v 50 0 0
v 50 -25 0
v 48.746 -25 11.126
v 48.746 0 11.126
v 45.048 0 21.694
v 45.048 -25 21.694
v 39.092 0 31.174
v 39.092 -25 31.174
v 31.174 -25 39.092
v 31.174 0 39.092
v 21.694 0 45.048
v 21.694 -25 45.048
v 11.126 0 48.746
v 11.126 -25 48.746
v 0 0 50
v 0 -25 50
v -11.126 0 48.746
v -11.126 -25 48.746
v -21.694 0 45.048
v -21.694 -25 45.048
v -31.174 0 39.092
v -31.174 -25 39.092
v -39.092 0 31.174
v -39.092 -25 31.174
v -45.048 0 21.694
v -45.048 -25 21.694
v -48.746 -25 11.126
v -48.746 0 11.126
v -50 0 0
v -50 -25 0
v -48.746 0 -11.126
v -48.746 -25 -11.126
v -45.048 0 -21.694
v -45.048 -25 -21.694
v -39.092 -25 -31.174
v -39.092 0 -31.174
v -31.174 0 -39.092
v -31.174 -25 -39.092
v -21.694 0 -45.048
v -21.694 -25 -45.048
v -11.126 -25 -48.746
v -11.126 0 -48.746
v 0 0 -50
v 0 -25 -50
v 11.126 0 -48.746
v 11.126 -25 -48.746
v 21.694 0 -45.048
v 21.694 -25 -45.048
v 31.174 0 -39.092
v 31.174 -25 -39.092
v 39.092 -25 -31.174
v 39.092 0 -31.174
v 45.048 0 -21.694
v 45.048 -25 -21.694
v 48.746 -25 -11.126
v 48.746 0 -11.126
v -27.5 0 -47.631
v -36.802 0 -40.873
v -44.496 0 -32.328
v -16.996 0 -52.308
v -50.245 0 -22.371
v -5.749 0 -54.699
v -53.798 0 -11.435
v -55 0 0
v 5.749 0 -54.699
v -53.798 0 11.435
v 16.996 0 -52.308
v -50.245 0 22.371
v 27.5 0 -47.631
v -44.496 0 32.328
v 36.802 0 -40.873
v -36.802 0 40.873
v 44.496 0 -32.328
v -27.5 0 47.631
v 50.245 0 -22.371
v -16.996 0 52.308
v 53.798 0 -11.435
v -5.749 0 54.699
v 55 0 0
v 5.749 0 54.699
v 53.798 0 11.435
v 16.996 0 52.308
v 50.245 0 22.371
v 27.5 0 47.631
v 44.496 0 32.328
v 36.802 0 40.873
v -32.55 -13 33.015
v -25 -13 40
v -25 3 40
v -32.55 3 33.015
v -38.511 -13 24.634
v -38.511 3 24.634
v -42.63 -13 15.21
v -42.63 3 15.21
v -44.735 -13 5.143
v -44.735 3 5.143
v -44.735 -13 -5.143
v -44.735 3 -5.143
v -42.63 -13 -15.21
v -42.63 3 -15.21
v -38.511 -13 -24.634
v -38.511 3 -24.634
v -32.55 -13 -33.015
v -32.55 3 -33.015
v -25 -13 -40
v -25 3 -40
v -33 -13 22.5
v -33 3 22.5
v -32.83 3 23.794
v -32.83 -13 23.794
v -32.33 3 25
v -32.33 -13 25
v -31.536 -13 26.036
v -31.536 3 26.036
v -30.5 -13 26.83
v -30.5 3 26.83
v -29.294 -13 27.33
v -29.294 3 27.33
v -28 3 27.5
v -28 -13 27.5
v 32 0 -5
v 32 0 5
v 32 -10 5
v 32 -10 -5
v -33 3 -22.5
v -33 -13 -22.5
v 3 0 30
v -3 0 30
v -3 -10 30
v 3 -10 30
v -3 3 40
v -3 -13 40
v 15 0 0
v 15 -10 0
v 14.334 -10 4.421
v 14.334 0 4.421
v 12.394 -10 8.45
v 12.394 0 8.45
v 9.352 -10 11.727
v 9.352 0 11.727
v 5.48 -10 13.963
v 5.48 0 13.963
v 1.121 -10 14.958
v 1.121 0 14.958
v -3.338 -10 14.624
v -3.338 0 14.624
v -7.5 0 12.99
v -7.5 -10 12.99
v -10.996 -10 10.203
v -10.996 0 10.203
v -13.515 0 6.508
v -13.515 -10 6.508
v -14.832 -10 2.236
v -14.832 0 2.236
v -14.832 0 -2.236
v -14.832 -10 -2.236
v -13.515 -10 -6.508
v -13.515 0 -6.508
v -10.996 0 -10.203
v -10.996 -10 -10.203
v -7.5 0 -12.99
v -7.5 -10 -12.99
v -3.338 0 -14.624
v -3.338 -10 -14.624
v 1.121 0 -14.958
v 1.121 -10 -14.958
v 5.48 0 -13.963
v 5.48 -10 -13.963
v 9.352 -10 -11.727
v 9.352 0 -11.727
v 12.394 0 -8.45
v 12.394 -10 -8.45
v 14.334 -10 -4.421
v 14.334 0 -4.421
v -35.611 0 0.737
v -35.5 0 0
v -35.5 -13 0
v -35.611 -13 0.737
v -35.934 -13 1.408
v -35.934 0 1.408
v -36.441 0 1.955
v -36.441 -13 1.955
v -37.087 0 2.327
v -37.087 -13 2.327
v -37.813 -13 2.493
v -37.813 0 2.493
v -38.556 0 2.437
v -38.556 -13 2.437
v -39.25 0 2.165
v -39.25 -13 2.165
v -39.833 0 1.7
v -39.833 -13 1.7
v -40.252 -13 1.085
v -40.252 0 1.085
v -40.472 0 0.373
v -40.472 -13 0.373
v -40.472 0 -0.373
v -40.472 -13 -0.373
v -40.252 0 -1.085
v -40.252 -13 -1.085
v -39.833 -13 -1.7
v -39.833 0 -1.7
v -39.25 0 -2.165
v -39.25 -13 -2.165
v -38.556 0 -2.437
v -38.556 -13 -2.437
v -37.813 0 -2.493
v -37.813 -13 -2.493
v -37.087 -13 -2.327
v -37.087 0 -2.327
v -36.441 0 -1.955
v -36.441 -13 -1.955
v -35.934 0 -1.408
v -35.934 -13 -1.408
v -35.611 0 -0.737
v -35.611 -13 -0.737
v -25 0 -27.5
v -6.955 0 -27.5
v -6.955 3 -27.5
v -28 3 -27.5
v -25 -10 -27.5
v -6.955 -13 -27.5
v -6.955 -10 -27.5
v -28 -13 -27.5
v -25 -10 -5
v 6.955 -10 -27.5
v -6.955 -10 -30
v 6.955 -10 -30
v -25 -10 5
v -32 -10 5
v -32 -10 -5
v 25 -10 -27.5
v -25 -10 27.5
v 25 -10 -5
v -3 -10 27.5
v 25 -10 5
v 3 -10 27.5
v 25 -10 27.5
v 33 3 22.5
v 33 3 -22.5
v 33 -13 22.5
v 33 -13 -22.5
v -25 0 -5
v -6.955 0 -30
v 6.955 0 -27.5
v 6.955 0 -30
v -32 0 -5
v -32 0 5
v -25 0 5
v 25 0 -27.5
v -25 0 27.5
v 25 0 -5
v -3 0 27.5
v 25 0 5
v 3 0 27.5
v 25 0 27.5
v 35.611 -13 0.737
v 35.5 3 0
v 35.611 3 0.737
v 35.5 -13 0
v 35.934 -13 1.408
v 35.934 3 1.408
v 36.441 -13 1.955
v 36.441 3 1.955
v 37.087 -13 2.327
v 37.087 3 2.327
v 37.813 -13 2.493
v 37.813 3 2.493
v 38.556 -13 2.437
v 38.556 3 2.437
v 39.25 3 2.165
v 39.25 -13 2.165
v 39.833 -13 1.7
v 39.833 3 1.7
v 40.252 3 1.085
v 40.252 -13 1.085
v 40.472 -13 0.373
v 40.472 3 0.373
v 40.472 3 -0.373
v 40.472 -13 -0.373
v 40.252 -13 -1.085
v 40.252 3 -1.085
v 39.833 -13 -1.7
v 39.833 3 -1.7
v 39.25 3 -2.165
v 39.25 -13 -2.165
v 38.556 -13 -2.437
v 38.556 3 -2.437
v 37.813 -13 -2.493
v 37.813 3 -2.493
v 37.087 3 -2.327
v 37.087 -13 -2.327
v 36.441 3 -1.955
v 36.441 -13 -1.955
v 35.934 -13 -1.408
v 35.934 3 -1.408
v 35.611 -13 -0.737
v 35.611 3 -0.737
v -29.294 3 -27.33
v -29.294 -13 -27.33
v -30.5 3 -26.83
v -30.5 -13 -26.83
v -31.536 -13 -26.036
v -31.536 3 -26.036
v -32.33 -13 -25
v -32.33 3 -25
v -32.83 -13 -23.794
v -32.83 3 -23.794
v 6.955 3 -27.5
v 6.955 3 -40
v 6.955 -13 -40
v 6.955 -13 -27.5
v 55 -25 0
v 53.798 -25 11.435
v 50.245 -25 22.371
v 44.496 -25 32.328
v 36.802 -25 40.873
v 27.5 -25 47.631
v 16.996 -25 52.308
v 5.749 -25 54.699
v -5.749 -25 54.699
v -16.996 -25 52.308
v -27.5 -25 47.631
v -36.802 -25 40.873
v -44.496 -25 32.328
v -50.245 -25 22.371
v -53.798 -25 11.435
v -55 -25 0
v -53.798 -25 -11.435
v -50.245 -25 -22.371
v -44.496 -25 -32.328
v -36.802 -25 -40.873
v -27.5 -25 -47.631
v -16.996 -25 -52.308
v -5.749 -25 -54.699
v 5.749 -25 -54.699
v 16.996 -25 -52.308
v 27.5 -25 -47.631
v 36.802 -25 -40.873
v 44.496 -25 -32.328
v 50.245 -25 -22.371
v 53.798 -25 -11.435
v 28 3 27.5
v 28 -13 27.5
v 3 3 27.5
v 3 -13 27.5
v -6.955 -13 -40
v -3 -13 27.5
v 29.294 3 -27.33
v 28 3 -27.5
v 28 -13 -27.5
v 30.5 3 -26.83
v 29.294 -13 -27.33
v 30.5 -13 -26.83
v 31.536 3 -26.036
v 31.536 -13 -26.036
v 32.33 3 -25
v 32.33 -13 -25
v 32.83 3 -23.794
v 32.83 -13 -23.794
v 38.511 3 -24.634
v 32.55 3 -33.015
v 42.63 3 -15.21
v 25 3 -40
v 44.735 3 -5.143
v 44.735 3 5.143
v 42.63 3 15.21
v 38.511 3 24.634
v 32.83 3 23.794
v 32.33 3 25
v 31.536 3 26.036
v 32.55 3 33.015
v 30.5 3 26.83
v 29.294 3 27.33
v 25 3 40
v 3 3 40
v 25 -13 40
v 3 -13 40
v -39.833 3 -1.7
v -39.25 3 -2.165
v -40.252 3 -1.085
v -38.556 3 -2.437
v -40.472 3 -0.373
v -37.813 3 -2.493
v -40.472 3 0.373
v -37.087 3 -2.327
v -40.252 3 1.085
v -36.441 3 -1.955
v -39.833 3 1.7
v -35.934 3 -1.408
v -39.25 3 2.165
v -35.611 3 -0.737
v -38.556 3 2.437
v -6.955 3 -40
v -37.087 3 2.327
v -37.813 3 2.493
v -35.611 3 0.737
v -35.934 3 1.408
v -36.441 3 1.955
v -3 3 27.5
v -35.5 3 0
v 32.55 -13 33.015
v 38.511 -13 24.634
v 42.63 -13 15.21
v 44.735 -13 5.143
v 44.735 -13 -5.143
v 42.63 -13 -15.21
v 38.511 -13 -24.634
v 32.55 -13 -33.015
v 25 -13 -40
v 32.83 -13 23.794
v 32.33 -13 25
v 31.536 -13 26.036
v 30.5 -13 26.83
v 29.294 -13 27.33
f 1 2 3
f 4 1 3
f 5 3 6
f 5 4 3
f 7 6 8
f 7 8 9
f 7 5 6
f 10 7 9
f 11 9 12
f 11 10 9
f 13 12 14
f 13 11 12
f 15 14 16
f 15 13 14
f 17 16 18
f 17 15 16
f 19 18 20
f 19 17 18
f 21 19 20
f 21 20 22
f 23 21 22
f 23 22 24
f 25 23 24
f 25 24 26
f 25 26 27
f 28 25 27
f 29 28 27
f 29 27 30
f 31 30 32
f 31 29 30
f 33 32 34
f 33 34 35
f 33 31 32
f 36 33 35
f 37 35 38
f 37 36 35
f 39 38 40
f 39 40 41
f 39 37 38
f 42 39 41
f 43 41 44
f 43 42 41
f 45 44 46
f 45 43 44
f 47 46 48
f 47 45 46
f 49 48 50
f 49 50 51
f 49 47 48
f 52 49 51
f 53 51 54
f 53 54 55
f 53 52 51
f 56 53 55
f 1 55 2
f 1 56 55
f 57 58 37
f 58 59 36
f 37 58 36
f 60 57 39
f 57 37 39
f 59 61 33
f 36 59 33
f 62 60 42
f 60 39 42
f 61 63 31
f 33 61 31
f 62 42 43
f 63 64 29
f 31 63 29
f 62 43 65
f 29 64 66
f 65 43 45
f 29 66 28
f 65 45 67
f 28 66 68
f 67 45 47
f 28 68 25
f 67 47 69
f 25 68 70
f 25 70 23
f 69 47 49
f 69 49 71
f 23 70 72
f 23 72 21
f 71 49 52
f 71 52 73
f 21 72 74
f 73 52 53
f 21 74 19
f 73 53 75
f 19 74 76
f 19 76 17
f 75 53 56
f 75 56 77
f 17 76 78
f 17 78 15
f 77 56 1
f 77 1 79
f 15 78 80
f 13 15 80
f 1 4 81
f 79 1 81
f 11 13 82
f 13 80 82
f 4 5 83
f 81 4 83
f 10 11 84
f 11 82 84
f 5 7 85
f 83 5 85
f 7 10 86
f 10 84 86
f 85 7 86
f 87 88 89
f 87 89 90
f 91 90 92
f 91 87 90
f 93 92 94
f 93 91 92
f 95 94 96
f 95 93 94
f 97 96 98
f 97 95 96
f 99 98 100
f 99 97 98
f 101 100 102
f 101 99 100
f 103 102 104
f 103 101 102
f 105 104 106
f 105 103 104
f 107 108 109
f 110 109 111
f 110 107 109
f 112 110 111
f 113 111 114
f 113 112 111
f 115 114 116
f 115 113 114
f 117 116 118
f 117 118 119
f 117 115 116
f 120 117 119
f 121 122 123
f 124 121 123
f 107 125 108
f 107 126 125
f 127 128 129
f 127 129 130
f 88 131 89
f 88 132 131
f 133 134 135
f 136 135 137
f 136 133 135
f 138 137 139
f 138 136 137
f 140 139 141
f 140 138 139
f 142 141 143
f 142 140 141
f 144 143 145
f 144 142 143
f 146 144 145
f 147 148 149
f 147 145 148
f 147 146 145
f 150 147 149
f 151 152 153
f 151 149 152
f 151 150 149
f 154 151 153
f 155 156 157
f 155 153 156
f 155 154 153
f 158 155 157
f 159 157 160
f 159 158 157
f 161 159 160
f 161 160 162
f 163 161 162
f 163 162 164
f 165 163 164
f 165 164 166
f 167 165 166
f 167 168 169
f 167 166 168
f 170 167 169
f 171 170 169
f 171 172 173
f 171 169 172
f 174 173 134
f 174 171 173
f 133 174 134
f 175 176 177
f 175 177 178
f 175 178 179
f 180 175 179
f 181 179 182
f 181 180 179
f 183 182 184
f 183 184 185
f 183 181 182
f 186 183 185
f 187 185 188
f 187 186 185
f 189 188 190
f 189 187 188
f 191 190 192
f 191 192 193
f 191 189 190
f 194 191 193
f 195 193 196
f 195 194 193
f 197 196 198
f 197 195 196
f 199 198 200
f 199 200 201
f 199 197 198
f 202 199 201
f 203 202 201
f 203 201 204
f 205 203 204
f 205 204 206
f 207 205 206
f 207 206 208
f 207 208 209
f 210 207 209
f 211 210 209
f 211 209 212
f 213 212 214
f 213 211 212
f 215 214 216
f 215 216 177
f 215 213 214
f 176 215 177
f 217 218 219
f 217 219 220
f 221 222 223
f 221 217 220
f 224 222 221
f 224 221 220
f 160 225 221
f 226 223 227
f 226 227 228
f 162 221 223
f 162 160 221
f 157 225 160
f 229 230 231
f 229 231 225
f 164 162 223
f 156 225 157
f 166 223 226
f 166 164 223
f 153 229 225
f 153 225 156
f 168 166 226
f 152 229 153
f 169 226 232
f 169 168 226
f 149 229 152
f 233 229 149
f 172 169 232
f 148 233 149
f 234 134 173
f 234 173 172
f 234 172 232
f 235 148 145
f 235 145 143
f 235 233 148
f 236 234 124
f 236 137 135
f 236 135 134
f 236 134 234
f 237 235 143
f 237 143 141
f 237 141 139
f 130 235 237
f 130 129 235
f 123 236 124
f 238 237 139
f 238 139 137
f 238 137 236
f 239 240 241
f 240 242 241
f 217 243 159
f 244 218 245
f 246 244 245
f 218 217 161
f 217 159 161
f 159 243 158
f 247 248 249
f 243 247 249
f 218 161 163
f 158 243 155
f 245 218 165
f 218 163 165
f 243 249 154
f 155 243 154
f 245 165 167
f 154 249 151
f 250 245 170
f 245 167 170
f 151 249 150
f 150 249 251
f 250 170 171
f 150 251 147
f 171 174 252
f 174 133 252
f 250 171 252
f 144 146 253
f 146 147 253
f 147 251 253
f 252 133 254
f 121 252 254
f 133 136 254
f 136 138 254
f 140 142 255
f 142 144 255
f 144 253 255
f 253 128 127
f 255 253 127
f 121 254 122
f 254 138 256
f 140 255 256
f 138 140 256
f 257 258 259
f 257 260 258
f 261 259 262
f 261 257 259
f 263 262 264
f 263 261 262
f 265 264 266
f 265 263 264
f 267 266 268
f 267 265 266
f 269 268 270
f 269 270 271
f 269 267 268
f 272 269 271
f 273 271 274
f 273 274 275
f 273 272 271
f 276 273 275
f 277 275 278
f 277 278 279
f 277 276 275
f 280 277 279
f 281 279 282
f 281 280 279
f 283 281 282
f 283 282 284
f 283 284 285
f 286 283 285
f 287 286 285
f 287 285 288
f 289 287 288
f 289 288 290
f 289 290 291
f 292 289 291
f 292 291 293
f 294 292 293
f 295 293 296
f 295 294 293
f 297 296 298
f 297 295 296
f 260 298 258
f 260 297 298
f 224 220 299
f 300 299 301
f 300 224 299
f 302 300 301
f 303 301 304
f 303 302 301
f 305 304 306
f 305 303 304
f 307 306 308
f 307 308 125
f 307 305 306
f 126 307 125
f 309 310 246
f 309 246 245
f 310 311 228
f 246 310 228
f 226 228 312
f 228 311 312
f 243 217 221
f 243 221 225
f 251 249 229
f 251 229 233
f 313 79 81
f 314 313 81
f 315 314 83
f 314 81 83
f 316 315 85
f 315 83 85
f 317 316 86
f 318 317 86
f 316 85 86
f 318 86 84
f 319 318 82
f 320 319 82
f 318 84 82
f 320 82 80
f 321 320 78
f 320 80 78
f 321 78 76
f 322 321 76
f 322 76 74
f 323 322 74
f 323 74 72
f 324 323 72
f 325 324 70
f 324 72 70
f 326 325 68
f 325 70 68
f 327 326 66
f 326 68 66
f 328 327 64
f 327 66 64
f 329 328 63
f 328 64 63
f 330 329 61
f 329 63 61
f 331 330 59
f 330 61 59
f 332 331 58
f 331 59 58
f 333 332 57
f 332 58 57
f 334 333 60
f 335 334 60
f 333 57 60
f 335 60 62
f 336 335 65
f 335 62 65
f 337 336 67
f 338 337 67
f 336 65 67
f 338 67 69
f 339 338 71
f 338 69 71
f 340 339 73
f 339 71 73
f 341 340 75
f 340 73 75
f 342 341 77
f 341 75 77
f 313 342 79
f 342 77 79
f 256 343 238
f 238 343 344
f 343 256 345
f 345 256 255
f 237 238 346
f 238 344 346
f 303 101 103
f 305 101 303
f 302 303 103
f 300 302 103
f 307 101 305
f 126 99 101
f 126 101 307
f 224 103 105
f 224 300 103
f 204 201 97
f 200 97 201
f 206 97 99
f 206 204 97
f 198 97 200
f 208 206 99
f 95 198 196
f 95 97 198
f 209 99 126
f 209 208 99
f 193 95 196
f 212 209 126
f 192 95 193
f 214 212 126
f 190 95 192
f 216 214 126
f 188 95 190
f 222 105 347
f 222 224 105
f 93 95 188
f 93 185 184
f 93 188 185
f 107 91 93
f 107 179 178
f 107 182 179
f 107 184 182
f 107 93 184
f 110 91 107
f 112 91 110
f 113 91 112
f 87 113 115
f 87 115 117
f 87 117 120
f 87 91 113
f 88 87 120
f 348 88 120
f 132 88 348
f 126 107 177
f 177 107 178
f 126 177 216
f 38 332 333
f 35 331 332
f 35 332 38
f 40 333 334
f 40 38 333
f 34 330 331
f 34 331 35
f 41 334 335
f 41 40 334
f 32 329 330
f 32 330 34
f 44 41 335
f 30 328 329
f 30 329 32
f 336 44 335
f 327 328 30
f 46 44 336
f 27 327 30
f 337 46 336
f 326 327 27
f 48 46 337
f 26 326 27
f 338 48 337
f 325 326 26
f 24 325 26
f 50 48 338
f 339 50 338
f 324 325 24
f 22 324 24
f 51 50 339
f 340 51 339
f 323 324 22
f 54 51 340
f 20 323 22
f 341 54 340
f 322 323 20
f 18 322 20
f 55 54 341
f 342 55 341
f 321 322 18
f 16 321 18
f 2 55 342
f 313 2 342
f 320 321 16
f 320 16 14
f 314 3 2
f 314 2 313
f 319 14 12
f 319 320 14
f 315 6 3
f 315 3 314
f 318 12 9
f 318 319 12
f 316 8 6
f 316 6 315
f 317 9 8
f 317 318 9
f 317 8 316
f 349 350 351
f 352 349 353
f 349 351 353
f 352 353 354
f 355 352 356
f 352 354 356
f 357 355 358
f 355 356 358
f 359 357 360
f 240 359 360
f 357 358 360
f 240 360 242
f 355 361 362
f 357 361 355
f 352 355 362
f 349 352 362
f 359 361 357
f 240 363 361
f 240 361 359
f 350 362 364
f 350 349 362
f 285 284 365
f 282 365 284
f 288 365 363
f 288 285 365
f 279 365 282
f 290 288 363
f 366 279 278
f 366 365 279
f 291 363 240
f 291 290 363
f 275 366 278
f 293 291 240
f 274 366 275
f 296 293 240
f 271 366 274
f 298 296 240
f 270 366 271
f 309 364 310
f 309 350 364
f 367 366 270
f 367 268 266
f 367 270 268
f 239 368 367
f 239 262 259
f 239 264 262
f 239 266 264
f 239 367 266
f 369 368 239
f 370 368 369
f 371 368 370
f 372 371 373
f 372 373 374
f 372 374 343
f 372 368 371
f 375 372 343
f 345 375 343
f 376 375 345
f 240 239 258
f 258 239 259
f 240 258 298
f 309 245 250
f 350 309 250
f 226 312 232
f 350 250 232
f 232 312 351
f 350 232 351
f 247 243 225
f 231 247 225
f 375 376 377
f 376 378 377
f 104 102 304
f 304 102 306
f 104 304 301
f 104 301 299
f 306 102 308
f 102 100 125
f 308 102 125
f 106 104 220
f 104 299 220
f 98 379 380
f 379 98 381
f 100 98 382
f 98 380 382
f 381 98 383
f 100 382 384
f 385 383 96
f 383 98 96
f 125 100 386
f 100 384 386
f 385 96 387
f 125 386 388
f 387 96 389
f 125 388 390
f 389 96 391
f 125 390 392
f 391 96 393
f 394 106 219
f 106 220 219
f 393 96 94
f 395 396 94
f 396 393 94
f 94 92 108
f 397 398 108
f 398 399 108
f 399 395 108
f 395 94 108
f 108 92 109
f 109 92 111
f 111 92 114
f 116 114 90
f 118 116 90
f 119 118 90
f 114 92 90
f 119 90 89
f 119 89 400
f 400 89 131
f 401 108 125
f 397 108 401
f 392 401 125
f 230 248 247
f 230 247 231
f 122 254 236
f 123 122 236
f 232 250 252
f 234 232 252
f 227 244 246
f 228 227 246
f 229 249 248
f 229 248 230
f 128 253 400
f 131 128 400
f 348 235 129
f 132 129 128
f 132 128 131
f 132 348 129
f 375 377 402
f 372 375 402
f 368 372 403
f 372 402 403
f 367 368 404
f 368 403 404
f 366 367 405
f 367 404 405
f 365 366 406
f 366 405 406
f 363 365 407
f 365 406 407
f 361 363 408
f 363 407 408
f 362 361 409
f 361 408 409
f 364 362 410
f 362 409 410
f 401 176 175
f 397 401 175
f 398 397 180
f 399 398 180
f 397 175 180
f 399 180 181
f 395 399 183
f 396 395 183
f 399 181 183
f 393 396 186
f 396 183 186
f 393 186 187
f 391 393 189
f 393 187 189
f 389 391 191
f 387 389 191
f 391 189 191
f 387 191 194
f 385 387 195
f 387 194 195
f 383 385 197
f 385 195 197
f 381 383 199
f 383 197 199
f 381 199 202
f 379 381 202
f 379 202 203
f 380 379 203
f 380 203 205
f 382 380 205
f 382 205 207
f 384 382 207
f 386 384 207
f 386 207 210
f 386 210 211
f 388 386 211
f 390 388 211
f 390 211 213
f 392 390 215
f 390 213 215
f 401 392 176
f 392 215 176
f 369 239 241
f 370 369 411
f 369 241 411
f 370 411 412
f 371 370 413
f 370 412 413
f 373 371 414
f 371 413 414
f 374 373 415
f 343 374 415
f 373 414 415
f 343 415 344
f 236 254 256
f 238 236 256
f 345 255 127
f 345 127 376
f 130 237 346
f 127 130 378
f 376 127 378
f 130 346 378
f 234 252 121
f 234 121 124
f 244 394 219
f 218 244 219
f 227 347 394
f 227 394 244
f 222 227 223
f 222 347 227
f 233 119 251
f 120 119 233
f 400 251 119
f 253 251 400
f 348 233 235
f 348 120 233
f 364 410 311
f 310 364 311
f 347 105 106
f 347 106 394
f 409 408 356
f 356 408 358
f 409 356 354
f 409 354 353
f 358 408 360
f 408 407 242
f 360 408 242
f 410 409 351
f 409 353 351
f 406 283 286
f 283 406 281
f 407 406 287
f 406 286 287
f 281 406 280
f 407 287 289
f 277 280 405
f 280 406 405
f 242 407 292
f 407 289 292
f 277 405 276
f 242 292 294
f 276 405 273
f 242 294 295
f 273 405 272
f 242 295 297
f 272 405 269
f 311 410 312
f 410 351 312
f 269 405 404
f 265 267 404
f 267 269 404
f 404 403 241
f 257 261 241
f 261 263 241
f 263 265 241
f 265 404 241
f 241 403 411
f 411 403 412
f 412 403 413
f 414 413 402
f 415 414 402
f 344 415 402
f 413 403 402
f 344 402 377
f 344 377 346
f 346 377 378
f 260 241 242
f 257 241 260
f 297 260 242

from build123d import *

# Parameters (mm, degrees)
F0_W          = 50
F0_H          = 60
F0_R          = 15
F1_DEPTH      = 10
F2_R          = 2.5
F3_DEPTH      = 13
F3_DEPTH_BACK = 3
F4_W          = 10
F4_H          = 10
F5_DEPTH      = 7
F7_R          = 55
F7_R_2        = 50
F8_DEPTH      = 25


# Not quite as in the source:
# - a feature names something its author has since deleted; it is built from what else it names


with BuildPart() as f1:
    # F0 (on Front) → F1 (new body)
    with BuildSketch(Plane.XZ):
        Rectangle(F0_W, F0_H)
        Circle(F0_R, mode=Mode.SUBTRACT)
    extrude(amount=F1_DEPTH)

    # F2 (on Front) → F3 (join, two sides)
    with BuildSketch(Plane.XZ) as f3_sk:
        with BuildLine():
            Line((-3, 40), (-25, 40))
            ThreePointArc((-25, 40), (-45, 0), (-25, -40))
            Line((-25, -40), (-6.9549679495, -40))
            Line((-6.9549679495, -40), (-6.9549679495, -27.5))
            Line((-6.9549679495, -27.5), (-28, -27.5))
            ThreePointArc((-28, -27.5), (-31.5355339059, -26.0355339059), (-33, -22.5))
            Line((-33, -22.5), (-33, 22.5))
            ThreePointArc((-33, 22.5), (-31.5355339059, 26.0355339059), (-28, 27.5))
            Line((-28, 27.5), (-3, 27.5))
            Line((-3, 27.5), (-3, 40))
        make_face()
        with Locations((-38, 0)):
            Circle(F2_R, mode=Mode.SUBTRACT)
    extrude(amount=F3_DEPTH)
    extrude(f3_sk.sketch, amount=-F3_DEPTH_BACK)

    # F4 (on face) → F5 (join)
    with BuildSketch(Plane(origin=(-25, 0, 0), x_dir=(0, -1, 0), z_dir=(-1, 0, 0))):
        with Locations((5, 0)):
            Rectangle(F4_W, F4_H)
    extrude(amount=F5_DEPTH)

    # F6: F1 across plane


with BuildPart() as f1_1:
    add(f1.part)
    add(f1.part.mirror(Plane.YZ))


with BuildPart() as f8:
    # F7 (on Front) → F8 (new body)
    with BuildSketch(Plane.XZ):
        Circle(F7_R)
        Circle(F7_R_2, mode=Mode.SUBTRACT)
    extrude(amount=F8_DEPTH)


solid = Compound([f1_1.part, f8.part])
